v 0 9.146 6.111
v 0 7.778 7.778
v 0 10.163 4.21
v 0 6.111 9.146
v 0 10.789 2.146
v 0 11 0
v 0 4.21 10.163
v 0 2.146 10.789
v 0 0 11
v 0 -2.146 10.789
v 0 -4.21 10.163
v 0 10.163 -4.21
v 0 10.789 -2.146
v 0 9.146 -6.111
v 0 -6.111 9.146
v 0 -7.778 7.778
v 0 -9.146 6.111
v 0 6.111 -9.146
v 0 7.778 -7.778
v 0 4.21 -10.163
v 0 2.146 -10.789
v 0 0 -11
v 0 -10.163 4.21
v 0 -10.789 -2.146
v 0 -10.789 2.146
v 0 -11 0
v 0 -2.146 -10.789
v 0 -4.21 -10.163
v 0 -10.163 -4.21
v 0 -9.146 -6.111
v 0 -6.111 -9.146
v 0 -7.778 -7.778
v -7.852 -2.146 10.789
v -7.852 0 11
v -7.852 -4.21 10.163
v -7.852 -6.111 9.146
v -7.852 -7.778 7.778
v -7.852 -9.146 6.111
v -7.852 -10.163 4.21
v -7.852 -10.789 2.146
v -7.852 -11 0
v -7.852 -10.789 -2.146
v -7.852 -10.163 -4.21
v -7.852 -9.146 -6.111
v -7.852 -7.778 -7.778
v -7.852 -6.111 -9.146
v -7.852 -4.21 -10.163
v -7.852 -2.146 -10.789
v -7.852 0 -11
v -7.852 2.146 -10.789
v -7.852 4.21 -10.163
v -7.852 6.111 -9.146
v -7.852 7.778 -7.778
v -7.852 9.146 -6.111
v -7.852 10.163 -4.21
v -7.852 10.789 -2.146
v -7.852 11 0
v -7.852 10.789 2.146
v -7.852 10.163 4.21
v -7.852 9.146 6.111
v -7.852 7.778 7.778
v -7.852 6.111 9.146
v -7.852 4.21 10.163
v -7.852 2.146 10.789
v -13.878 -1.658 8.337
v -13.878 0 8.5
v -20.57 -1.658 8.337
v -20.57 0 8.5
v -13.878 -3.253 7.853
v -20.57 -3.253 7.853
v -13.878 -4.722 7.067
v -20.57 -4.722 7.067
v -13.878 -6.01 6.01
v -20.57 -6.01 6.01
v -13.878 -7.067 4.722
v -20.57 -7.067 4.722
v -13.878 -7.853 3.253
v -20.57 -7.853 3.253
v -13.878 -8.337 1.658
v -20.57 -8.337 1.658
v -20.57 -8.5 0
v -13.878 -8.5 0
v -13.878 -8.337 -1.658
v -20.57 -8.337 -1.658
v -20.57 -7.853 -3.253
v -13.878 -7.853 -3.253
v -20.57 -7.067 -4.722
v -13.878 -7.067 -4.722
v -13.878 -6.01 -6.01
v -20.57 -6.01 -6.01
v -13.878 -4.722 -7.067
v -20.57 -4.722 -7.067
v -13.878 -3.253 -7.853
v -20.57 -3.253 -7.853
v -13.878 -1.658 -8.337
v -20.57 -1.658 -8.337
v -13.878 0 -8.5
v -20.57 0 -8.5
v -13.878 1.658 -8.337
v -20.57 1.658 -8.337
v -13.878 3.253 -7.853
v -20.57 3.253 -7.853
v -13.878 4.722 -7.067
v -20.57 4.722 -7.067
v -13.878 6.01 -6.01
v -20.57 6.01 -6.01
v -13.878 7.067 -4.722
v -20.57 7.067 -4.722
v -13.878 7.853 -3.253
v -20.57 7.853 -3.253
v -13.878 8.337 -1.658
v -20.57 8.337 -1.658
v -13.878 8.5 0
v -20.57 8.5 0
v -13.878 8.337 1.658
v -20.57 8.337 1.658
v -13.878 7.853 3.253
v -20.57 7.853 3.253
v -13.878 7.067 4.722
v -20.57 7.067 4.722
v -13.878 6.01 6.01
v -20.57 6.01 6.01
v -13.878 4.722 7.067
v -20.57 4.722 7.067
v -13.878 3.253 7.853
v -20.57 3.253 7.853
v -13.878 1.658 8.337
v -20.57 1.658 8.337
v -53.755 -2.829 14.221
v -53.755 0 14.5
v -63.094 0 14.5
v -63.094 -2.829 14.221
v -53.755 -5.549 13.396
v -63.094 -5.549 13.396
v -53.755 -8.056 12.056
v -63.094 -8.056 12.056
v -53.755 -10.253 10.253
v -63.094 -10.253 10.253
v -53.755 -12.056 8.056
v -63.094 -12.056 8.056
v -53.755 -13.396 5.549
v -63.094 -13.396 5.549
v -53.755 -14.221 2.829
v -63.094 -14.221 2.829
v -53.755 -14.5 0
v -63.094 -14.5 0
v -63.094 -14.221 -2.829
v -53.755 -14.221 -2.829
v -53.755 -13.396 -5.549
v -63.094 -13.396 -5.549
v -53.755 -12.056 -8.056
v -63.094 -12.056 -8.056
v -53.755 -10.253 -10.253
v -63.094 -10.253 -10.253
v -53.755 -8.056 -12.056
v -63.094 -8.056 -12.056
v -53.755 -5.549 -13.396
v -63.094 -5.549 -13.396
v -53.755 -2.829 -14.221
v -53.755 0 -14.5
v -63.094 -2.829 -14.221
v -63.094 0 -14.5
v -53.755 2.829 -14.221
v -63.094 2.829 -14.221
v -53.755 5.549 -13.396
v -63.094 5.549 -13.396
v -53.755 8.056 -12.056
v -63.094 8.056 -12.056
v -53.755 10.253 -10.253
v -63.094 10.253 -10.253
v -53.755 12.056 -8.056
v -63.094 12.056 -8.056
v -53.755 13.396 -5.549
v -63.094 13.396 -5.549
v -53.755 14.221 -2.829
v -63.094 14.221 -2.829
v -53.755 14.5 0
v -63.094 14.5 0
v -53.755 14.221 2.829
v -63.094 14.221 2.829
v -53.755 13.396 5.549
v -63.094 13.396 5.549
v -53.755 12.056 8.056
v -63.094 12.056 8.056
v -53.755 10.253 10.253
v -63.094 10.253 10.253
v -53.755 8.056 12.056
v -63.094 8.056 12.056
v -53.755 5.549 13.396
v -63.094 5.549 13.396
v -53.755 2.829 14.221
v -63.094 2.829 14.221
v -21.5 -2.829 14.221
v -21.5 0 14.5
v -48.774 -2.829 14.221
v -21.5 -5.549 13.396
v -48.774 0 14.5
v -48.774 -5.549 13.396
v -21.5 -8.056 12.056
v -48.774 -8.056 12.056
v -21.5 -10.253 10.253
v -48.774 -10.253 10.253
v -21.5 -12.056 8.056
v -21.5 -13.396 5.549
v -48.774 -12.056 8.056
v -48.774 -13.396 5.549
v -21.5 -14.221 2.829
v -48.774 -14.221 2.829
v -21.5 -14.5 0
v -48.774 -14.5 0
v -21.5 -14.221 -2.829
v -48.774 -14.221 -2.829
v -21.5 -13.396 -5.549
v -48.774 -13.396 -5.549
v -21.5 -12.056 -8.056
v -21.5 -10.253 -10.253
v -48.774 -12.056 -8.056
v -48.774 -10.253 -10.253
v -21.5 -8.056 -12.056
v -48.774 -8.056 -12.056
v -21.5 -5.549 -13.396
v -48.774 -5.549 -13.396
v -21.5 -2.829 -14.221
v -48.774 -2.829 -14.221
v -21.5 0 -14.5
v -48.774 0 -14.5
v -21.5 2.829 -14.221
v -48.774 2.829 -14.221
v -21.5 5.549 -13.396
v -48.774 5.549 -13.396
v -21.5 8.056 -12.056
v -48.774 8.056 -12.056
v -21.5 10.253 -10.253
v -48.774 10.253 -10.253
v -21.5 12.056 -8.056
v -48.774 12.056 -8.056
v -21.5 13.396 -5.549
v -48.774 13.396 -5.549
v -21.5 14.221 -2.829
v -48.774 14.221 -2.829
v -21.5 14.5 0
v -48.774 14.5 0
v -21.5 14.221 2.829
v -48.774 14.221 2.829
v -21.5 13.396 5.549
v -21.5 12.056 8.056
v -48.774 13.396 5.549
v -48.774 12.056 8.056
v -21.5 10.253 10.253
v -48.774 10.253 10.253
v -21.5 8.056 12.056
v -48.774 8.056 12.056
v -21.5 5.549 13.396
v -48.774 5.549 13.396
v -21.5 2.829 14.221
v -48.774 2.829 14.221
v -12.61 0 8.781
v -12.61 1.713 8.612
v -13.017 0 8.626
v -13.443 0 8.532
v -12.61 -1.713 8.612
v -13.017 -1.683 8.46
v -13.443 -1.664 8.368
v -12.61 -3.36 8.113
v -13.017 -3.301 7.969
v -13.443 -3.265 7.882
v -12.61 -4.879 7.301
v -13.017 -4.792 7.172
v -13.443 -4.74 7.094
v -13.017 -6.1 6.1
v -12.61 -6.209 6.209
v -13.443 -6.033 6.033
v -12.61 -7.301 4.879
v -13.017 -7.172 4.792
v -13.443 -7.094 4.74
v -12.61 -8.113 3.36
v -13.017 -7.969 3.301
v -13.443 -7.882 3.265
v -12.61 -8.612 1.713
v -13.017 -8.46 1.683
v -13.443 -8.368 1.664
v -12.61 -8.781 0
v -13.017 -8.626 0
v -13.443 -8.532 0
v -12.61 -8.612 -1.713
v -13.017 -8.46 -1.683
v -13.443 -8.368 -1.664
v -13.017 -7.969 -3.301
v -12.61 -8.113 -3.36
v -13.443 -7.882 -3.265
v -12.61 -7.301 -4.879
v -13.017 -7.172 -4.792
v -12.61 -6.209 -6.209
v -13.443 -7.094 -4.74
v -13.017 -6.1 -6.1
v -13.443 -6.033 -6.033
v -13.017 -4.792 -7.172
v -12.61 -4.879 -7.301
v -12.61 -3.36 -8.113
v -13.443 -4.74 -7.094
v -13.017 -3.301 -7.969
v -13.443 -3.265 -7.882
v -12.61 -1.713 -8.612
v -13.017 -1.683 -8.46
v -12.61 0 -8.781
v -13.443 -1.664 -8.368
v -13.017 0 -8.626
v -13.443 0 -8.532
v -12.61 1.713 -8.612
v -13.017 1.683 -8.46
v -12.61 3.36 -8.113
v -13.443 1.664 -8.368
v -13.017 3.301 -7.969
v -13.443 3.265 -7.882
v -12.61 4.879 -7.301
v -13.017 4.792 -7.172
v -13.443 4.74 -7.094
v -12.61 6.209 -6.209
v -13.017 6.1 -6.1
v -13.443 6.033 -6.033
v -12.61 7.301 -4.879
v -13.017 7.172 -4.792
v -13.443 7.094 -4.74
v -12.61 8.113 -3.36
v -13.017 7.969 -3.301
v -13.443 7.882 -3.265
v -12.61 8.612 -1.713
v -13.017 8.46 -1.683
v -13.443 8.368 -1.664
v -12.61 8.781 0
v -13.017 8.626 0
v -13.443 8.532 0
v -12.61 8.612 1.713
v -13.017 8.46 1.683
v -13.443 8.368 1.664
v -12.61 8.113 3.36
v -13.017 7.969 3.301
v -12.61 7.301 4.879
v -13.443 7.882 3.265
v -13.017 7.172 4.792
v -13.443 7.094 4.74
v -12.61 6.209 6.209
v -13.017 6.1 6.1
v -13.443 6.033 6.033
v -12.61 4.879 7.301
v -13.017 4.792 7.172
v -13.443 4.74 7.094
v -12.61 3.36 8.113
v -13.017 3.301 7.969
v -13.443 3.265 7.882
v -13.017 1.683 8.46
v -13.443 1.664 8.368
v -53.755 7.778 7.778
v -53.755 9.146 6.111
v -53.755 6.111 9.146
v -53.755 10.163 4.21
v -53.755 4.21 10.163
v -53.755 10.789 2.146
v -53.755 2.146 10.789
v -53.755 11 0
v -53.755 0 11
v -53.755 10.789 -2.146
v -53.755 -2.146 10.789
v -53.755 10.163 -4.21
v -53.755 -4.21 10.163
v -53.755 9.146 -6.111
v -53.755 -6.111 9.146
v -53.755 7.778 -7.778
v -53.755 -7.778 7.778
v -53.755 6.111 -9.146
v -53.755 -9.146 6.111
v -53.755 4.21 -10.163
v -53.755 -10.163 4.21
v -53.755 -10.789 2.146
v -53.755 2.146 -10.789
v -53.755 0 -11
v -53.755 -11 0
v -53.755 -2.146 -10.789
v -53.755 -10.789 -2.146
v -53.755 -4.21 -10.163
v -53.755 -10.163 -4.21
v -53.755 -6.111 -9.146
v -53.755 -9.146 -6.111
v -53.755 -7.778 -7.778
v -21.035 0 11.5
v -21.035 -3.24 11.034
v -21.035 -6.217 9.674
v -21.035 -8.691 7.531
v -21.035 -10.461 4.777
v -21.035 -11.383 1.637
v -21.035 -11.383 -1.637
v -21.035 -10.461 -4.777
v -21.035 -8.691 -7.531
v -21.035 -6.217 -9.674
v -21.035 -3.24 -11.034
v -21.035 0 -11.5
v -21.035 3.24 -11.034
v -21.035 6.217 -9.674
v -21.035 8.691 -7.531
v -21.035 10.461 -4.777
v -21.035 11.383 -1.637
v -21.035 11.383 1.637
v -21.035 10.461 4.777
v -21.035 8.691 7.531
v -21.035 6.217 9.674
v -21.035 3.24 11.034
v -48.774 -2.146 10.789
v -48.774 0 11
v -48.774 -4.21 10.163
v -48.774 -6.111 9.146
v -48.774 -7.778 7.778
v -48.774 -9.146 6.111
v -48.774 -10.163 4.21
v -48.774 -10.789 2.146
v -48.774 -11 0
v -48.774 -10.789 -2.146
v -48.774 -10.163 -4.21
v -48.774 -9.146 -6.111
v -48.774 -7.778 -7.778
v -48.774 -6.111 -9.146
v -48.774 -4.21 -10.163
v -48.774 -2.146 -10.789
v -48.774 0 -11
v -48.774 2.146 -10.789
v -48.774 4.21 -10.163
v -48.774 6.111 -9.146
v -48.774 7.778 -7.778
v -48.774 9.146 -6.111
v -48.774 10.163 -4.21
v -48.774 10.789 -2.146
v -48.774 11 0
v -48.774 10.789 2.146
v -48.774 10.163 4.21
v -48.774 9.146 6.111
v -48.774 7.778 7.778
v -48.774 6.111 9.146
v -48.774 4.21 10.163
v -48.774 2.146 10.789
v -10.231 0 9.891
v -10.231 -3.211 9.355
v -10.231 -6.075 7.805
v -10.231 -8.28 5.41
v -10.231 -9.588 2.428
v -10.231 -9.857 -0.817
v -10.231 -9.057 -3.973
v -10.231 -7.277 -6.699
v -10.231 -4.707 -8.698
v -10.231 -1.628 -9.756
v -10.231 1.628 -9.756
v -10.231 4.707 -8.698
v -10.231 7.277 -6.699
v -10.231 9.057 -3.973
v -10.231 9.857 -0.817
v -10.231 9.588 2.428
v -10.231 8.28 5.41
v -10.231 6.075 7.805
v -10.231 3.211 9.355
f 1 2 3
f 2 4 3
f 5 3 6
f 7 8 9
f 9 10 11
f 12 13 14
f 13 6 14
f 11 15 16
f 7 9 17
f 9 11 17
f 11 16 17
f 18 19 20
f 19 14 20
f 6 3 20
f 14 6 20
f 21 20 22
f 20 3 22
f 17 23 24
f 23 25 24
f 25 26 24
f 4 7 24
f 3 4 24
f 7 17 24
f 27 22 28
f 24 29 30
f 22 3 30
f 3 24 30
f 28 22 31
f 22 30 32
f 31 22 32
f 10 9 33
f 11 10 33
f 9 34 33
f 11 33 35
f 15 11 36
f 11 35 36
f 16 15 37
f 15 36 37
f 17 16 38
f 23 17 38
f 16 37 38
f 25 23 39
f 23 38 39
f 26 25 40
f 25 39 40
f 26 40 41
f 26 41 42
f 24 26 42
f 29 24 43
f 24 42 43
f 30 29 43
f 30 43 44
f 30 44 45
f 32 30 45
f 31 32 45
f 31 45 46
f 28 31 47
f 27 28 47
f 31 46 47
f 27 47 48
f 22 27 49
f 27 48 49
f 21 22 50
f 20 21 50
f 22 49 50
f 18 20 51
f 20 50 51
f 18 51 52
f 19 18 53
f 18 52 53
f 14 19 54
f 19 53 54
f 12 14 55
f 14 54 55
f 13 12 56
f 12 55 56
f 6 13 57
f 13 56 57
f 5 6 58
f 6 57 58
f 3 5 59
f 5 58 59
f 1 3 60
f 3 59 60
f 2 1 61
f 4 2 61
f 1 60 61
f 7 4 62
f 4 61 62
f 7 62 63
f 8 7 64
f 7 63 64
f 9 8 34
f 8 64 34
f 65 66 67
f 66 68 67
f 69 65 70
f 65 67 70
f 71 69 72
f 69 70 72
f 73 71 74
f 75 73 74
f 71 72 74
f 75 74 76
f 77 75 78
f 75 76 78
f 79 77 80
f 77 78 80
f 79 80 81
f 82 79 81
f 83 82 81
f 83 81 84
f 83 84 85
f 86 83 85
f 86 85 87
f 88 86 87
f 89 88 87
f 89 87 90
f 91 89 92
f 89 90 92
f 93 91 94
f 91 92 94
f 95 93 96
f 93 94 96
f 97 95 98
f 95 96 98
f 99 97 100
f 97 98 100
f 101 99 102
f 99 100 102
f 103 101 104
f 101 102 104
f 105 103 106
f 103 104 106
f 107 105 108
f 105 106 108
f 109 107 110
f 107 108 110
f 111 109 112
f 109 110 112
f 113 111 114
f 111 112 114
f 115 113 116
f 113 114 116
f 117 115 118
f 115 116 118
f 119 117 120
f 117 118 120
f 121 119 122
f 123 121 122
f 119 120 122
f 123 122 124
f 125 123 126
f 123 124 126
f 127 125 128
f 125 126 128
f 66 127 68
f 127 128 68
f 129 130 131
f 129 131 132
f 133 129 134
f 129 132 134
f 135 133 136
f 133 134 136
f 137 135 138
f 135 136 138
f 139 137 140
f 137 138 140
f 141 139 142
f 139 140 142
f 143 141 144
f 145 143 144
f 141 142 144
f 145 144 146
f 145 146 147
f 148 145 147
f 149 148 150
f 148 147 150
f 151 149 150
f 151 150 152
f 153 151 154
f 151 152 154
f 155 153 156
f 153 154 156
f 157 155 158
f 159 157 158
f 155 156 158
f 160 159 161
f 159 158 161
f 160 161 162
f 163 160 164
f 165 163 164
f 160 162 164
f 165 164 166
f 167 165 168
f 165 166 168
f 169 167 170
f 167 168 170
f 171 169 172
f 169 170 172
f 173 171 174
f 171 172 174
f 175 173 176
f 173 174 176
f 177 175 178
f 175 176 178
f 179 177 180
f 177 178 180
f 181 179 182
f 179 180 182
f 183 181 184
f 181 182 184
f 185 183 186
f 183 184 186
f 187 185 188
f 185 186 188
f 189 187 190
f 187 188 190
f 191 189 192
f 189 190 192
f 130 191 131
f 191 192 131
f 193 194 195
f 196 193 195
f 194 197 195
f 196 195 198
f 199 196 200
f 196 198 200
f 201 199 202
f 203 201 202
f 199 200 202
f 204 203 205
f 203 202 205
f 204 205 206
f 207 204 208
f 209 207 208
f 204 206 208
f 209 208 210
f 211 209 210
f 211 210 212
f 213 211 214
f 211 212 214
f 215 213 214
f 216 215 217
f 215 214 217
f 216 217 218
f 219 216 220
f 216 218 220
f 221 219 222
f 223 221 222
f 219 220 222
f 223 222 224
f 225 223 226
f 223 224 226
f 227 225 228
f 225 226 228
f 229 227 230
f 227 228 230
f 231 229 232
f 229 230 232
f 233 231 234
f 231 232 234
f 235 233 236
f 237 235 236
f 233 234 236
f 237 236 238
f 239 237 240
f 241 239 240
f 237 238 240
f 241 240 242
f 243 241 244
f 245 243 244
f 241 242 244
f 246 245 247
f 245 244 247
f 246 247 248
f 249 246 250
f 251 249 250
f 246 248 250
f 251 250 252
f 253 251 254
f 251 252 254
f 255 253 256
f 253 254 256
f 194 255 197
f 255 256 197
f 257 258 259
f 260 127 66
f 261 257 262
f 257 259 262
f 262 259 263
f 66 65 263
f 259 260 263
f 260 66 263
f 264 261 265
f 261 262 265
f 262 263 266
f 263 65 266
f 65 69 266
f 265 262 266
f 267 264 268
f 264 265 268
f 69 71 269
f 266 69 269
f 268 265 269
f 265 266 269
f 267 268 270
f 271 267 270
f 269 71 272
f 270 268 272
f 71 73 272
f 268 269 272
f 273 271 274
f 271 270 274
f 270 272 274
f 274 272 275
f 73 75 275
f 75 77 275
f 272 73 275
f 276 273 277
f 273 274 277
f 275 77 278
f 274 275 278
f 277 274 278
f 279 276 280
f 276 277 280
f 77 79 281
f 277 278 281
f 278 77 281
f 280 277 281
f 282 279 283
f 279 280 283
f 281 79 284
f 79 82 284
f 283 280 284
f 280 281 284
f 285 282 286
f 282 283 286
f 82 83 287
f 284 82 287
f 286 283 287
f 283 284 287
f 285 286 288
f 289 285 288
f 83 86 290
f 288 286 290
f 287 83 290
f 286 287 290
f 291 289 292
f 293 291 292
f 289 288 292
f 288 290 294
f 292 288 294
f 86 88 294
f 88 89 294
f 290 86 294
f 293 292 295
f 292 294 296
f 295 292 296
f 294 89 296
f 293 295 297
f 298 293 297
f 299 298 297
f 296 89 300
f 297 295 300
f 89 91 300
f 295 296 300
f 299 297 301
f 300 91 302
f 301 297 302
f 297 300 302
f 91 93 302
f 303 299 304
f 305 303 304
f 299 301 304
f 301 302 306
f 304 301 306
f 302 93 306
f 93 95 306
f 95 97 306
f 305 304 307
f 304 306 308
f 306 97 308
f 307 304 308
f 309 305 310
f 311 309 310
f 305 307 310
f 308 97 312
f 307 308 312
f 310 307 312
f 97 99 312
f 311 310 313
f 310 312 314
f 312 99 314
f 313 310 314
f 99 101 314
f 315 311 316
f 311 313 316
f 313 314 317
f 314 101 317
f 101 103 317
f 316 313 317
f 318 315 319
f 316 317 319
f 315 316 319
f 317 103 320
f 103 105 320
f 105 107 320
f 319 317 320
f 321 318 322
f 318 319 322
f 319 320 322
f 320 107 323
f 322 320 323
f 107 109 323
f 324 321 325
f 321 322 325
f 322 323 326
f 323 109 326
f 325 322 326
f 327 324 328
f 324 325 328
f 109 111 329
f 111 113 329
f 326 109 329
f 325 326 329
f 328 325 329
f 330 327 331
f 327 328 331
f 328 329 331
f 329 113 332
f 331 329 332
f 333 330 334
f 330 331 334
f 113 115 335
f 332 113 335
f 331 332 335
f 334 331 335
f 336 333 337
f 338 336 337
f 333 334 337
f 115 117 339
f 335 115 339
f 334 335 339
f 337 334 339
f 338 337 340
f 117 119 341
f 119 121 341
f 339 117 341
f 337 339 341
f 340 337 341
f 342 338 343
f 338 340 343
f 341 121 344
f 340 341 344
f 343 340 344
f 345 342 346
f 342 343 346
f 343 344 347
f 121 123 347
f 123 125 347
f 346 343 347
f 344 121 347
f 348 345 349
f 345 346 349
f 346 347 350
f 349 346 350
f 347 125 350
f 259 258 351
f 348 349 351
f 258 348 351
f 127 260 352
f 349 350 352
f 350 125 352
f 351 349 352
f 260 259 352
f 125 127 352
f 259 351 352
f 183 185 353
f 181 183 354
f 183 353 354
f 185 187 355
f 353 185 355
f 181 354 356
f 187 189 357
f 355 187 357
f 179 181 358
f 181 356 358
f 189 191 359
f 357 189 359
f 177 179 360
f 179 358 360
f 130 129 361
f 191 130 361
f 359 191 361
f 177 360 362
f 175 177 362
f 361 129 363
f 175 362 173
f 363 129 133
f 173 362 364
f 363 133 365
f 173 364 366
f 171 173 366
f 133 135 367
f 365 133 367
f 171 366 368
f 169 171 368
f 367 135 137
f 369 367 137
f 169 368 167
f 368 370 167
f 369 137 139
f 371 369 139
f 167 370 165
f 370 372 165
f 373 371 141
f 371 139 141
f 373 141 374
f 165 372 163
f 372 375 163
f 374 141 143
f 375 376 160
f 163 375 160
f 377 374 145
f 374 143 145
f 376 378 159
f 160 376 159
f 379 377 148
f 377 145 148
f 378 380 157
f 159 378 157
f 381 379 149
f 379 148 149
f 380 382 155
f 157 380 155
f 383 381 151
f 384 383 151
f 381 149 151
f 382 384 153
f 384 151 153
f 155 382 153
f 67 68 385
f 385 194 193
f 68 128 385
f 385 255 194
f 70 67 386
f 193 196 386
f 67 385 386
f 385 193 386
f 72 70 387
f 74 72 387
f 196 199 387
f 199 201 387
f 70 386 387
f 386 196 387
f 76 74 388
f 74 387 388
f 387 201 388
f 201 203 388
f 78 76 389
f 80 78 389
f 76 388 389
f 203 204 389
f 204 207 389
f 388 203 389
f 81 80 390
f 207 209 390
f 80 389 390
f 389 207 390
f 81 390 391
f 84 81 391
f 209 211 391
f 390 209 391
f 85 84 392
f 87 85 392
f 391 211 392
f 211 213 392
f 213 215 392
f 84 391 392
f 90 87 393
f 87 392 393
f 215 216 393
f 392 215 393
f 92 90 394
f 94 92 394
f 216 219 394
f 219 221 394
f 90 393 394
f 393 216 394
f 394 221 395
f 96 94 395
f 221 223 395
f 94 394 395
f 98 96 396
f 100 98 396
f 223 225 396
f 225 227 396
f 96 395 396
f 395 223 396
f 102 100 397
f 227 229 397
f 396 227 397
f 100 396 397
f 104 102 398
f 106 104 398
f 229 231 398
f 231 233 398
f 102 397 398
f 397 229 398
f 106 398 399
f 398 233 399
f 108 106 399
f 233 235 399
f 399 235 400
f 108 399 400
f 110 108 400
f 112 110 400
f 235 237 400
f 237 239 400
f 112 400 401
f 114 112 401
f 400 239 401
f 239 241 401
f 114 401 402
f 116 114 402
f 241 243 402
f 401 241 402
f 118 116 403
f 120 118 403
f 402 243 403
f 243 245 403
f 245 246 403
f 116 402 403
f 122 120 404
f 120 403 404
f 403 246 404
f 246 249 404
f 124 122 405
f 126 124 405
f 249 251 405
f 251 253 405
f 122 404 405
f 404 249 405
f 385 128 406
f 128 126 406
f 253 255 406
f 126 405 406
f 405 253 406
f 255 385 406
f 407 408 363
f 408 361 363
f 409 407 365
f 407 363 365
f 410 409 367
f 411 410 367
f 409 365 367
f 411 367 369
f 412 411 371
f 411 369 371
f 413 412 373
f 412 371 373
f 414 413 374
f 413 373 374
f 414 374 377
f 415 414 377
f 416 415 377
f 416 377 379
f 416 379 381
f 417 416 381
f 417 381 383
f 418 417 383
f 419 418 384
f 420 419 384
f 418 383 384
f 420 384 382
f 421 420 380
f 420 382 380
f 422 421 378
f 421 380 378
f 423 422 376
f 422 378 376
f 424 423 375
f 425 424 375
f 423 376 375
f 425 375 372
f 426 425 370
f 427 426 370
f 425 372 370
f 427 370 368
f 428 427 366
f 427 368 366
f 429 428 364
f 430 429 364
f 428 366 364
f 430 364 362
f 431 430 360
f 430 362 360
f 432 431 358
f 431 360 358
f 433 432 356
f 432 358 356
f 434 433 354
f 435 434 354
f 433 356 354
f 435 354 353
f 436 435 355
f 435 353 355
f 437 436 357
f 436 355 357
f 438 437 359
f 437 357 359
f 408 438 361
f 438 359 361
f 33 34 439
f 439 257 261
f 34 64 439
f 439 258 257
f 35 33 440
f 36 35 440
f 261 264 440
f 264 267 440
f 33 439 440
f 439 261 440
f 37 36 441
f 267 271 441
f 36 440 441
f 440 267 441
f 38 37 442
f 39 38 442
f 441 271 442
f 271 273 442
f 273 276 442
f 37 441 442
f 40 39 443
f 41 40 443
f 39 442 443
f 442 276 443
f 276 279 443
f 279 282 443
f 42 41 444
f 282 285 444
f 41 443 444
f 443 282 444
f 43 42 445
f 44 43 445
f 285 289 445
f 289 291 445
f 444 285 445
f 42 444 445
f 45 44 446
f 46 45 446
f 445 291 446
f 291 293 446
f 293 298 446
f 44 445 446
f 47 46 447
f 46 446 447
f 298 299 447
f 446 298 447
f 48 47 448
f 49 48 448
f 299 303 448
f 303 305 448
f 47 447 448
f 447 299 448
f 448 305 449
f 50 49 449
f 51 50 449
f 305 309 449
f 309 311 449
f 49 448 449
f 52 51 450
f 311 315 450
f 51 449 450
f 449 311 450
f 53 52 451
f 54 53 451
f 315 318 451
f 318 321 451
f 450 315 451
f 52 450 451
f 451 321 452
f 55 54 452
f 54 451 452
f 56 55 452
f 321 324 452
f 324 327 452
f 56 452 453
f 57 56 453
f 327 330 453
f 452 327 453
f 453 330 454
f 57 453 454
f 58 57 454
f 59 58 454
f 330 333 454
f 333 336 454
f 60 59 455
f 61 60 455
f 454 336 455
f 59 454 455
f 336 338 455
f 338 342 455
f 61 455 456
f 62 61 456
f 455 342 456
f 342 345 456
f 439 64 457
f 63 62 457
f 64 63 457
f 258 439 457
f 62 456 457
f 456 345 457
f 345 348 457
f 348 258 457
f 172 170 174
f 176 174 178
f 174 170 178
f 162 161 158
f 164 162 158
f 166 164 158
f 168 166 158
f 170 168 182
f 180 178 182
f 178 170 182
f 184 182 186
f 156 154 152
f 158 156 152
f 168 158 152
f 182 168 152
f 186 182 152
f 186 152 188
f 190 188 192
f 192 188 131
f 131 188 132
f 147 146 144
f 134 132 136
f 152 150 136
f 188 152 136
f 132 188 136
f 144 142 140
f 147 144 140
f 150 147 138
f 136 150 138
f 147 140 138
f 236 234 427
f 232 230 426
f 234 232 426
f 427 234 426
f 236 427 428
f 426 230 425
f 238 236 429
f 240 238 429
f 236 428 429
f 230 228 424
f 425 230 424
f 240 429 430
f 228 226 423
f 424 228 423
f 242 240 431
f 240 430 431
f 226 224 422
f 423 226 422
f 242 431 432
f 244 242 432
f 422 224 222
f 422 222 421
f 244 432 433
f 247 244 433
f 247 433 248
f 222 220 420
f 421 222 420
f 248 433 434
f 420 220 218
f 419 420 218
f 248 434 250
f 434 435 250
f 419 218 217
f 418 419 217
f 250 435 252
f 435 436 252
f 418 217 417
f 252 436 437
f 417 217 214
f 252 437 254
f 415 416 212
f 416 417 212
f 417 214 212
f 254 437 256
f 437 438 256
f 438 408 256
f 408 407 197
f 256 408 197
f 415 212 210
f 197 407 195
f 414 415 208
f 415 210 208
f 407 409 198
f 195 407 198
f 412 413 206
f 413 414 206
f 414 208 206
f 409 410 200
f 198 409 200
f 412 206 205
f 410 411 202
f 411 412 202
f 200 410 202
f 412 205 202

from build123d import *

# Parameters (mm, degrees)
F2_R     = 6
F3_DEPTH = 25


with BuildPart() as f1:
    # F0 (on Front) → F1 (revolve)
    with BuildSketch(Plane.XZ):
        with BuildLine():
            Line((0, 0), (0, 11))
            Line((0, 11), (-7.851503, 11))
            Line((-7.851503, 11), (-12.61, 8.781077))
            ThreePointArc((-12.61, 8.781077), (-13.228536, 8.571112), (-13.877855, 8.5))
            Line((-13.877855, 8.5), (-20.57, 8.5))
            Line((-20.57, 8.5), (-21.5, 14.5))
            Line((-21.5, 14.5), (-30.571486, 14.5))
            Line((-30.571486, 14.5), (-48.773584, 14.5))
            Line((-48.773584, 14.5), (-48.773584, 11))
            Line((-48.773584, 11), (-53.754714, 11))
            Line((-53.754714, 11), (-53.754714, 14.5))
            Line((-53.754714, 14.5), (-63.094336, 14.5))
            Line((-63.094336, 14.5), (-63.094336, 0))
            Line((-63.094336, 0), (0, 0))
        make_face()
    revolve(axis=Axis((-31.547168, 0, 0), (1, 0, 0)))

    # F2 (on face) → F3 (join)
    with BuildSketch(Plane.YZ):
        Circle(F2_R)
    extrude(amount=-F3_DEPTH)


solid = f1.part
